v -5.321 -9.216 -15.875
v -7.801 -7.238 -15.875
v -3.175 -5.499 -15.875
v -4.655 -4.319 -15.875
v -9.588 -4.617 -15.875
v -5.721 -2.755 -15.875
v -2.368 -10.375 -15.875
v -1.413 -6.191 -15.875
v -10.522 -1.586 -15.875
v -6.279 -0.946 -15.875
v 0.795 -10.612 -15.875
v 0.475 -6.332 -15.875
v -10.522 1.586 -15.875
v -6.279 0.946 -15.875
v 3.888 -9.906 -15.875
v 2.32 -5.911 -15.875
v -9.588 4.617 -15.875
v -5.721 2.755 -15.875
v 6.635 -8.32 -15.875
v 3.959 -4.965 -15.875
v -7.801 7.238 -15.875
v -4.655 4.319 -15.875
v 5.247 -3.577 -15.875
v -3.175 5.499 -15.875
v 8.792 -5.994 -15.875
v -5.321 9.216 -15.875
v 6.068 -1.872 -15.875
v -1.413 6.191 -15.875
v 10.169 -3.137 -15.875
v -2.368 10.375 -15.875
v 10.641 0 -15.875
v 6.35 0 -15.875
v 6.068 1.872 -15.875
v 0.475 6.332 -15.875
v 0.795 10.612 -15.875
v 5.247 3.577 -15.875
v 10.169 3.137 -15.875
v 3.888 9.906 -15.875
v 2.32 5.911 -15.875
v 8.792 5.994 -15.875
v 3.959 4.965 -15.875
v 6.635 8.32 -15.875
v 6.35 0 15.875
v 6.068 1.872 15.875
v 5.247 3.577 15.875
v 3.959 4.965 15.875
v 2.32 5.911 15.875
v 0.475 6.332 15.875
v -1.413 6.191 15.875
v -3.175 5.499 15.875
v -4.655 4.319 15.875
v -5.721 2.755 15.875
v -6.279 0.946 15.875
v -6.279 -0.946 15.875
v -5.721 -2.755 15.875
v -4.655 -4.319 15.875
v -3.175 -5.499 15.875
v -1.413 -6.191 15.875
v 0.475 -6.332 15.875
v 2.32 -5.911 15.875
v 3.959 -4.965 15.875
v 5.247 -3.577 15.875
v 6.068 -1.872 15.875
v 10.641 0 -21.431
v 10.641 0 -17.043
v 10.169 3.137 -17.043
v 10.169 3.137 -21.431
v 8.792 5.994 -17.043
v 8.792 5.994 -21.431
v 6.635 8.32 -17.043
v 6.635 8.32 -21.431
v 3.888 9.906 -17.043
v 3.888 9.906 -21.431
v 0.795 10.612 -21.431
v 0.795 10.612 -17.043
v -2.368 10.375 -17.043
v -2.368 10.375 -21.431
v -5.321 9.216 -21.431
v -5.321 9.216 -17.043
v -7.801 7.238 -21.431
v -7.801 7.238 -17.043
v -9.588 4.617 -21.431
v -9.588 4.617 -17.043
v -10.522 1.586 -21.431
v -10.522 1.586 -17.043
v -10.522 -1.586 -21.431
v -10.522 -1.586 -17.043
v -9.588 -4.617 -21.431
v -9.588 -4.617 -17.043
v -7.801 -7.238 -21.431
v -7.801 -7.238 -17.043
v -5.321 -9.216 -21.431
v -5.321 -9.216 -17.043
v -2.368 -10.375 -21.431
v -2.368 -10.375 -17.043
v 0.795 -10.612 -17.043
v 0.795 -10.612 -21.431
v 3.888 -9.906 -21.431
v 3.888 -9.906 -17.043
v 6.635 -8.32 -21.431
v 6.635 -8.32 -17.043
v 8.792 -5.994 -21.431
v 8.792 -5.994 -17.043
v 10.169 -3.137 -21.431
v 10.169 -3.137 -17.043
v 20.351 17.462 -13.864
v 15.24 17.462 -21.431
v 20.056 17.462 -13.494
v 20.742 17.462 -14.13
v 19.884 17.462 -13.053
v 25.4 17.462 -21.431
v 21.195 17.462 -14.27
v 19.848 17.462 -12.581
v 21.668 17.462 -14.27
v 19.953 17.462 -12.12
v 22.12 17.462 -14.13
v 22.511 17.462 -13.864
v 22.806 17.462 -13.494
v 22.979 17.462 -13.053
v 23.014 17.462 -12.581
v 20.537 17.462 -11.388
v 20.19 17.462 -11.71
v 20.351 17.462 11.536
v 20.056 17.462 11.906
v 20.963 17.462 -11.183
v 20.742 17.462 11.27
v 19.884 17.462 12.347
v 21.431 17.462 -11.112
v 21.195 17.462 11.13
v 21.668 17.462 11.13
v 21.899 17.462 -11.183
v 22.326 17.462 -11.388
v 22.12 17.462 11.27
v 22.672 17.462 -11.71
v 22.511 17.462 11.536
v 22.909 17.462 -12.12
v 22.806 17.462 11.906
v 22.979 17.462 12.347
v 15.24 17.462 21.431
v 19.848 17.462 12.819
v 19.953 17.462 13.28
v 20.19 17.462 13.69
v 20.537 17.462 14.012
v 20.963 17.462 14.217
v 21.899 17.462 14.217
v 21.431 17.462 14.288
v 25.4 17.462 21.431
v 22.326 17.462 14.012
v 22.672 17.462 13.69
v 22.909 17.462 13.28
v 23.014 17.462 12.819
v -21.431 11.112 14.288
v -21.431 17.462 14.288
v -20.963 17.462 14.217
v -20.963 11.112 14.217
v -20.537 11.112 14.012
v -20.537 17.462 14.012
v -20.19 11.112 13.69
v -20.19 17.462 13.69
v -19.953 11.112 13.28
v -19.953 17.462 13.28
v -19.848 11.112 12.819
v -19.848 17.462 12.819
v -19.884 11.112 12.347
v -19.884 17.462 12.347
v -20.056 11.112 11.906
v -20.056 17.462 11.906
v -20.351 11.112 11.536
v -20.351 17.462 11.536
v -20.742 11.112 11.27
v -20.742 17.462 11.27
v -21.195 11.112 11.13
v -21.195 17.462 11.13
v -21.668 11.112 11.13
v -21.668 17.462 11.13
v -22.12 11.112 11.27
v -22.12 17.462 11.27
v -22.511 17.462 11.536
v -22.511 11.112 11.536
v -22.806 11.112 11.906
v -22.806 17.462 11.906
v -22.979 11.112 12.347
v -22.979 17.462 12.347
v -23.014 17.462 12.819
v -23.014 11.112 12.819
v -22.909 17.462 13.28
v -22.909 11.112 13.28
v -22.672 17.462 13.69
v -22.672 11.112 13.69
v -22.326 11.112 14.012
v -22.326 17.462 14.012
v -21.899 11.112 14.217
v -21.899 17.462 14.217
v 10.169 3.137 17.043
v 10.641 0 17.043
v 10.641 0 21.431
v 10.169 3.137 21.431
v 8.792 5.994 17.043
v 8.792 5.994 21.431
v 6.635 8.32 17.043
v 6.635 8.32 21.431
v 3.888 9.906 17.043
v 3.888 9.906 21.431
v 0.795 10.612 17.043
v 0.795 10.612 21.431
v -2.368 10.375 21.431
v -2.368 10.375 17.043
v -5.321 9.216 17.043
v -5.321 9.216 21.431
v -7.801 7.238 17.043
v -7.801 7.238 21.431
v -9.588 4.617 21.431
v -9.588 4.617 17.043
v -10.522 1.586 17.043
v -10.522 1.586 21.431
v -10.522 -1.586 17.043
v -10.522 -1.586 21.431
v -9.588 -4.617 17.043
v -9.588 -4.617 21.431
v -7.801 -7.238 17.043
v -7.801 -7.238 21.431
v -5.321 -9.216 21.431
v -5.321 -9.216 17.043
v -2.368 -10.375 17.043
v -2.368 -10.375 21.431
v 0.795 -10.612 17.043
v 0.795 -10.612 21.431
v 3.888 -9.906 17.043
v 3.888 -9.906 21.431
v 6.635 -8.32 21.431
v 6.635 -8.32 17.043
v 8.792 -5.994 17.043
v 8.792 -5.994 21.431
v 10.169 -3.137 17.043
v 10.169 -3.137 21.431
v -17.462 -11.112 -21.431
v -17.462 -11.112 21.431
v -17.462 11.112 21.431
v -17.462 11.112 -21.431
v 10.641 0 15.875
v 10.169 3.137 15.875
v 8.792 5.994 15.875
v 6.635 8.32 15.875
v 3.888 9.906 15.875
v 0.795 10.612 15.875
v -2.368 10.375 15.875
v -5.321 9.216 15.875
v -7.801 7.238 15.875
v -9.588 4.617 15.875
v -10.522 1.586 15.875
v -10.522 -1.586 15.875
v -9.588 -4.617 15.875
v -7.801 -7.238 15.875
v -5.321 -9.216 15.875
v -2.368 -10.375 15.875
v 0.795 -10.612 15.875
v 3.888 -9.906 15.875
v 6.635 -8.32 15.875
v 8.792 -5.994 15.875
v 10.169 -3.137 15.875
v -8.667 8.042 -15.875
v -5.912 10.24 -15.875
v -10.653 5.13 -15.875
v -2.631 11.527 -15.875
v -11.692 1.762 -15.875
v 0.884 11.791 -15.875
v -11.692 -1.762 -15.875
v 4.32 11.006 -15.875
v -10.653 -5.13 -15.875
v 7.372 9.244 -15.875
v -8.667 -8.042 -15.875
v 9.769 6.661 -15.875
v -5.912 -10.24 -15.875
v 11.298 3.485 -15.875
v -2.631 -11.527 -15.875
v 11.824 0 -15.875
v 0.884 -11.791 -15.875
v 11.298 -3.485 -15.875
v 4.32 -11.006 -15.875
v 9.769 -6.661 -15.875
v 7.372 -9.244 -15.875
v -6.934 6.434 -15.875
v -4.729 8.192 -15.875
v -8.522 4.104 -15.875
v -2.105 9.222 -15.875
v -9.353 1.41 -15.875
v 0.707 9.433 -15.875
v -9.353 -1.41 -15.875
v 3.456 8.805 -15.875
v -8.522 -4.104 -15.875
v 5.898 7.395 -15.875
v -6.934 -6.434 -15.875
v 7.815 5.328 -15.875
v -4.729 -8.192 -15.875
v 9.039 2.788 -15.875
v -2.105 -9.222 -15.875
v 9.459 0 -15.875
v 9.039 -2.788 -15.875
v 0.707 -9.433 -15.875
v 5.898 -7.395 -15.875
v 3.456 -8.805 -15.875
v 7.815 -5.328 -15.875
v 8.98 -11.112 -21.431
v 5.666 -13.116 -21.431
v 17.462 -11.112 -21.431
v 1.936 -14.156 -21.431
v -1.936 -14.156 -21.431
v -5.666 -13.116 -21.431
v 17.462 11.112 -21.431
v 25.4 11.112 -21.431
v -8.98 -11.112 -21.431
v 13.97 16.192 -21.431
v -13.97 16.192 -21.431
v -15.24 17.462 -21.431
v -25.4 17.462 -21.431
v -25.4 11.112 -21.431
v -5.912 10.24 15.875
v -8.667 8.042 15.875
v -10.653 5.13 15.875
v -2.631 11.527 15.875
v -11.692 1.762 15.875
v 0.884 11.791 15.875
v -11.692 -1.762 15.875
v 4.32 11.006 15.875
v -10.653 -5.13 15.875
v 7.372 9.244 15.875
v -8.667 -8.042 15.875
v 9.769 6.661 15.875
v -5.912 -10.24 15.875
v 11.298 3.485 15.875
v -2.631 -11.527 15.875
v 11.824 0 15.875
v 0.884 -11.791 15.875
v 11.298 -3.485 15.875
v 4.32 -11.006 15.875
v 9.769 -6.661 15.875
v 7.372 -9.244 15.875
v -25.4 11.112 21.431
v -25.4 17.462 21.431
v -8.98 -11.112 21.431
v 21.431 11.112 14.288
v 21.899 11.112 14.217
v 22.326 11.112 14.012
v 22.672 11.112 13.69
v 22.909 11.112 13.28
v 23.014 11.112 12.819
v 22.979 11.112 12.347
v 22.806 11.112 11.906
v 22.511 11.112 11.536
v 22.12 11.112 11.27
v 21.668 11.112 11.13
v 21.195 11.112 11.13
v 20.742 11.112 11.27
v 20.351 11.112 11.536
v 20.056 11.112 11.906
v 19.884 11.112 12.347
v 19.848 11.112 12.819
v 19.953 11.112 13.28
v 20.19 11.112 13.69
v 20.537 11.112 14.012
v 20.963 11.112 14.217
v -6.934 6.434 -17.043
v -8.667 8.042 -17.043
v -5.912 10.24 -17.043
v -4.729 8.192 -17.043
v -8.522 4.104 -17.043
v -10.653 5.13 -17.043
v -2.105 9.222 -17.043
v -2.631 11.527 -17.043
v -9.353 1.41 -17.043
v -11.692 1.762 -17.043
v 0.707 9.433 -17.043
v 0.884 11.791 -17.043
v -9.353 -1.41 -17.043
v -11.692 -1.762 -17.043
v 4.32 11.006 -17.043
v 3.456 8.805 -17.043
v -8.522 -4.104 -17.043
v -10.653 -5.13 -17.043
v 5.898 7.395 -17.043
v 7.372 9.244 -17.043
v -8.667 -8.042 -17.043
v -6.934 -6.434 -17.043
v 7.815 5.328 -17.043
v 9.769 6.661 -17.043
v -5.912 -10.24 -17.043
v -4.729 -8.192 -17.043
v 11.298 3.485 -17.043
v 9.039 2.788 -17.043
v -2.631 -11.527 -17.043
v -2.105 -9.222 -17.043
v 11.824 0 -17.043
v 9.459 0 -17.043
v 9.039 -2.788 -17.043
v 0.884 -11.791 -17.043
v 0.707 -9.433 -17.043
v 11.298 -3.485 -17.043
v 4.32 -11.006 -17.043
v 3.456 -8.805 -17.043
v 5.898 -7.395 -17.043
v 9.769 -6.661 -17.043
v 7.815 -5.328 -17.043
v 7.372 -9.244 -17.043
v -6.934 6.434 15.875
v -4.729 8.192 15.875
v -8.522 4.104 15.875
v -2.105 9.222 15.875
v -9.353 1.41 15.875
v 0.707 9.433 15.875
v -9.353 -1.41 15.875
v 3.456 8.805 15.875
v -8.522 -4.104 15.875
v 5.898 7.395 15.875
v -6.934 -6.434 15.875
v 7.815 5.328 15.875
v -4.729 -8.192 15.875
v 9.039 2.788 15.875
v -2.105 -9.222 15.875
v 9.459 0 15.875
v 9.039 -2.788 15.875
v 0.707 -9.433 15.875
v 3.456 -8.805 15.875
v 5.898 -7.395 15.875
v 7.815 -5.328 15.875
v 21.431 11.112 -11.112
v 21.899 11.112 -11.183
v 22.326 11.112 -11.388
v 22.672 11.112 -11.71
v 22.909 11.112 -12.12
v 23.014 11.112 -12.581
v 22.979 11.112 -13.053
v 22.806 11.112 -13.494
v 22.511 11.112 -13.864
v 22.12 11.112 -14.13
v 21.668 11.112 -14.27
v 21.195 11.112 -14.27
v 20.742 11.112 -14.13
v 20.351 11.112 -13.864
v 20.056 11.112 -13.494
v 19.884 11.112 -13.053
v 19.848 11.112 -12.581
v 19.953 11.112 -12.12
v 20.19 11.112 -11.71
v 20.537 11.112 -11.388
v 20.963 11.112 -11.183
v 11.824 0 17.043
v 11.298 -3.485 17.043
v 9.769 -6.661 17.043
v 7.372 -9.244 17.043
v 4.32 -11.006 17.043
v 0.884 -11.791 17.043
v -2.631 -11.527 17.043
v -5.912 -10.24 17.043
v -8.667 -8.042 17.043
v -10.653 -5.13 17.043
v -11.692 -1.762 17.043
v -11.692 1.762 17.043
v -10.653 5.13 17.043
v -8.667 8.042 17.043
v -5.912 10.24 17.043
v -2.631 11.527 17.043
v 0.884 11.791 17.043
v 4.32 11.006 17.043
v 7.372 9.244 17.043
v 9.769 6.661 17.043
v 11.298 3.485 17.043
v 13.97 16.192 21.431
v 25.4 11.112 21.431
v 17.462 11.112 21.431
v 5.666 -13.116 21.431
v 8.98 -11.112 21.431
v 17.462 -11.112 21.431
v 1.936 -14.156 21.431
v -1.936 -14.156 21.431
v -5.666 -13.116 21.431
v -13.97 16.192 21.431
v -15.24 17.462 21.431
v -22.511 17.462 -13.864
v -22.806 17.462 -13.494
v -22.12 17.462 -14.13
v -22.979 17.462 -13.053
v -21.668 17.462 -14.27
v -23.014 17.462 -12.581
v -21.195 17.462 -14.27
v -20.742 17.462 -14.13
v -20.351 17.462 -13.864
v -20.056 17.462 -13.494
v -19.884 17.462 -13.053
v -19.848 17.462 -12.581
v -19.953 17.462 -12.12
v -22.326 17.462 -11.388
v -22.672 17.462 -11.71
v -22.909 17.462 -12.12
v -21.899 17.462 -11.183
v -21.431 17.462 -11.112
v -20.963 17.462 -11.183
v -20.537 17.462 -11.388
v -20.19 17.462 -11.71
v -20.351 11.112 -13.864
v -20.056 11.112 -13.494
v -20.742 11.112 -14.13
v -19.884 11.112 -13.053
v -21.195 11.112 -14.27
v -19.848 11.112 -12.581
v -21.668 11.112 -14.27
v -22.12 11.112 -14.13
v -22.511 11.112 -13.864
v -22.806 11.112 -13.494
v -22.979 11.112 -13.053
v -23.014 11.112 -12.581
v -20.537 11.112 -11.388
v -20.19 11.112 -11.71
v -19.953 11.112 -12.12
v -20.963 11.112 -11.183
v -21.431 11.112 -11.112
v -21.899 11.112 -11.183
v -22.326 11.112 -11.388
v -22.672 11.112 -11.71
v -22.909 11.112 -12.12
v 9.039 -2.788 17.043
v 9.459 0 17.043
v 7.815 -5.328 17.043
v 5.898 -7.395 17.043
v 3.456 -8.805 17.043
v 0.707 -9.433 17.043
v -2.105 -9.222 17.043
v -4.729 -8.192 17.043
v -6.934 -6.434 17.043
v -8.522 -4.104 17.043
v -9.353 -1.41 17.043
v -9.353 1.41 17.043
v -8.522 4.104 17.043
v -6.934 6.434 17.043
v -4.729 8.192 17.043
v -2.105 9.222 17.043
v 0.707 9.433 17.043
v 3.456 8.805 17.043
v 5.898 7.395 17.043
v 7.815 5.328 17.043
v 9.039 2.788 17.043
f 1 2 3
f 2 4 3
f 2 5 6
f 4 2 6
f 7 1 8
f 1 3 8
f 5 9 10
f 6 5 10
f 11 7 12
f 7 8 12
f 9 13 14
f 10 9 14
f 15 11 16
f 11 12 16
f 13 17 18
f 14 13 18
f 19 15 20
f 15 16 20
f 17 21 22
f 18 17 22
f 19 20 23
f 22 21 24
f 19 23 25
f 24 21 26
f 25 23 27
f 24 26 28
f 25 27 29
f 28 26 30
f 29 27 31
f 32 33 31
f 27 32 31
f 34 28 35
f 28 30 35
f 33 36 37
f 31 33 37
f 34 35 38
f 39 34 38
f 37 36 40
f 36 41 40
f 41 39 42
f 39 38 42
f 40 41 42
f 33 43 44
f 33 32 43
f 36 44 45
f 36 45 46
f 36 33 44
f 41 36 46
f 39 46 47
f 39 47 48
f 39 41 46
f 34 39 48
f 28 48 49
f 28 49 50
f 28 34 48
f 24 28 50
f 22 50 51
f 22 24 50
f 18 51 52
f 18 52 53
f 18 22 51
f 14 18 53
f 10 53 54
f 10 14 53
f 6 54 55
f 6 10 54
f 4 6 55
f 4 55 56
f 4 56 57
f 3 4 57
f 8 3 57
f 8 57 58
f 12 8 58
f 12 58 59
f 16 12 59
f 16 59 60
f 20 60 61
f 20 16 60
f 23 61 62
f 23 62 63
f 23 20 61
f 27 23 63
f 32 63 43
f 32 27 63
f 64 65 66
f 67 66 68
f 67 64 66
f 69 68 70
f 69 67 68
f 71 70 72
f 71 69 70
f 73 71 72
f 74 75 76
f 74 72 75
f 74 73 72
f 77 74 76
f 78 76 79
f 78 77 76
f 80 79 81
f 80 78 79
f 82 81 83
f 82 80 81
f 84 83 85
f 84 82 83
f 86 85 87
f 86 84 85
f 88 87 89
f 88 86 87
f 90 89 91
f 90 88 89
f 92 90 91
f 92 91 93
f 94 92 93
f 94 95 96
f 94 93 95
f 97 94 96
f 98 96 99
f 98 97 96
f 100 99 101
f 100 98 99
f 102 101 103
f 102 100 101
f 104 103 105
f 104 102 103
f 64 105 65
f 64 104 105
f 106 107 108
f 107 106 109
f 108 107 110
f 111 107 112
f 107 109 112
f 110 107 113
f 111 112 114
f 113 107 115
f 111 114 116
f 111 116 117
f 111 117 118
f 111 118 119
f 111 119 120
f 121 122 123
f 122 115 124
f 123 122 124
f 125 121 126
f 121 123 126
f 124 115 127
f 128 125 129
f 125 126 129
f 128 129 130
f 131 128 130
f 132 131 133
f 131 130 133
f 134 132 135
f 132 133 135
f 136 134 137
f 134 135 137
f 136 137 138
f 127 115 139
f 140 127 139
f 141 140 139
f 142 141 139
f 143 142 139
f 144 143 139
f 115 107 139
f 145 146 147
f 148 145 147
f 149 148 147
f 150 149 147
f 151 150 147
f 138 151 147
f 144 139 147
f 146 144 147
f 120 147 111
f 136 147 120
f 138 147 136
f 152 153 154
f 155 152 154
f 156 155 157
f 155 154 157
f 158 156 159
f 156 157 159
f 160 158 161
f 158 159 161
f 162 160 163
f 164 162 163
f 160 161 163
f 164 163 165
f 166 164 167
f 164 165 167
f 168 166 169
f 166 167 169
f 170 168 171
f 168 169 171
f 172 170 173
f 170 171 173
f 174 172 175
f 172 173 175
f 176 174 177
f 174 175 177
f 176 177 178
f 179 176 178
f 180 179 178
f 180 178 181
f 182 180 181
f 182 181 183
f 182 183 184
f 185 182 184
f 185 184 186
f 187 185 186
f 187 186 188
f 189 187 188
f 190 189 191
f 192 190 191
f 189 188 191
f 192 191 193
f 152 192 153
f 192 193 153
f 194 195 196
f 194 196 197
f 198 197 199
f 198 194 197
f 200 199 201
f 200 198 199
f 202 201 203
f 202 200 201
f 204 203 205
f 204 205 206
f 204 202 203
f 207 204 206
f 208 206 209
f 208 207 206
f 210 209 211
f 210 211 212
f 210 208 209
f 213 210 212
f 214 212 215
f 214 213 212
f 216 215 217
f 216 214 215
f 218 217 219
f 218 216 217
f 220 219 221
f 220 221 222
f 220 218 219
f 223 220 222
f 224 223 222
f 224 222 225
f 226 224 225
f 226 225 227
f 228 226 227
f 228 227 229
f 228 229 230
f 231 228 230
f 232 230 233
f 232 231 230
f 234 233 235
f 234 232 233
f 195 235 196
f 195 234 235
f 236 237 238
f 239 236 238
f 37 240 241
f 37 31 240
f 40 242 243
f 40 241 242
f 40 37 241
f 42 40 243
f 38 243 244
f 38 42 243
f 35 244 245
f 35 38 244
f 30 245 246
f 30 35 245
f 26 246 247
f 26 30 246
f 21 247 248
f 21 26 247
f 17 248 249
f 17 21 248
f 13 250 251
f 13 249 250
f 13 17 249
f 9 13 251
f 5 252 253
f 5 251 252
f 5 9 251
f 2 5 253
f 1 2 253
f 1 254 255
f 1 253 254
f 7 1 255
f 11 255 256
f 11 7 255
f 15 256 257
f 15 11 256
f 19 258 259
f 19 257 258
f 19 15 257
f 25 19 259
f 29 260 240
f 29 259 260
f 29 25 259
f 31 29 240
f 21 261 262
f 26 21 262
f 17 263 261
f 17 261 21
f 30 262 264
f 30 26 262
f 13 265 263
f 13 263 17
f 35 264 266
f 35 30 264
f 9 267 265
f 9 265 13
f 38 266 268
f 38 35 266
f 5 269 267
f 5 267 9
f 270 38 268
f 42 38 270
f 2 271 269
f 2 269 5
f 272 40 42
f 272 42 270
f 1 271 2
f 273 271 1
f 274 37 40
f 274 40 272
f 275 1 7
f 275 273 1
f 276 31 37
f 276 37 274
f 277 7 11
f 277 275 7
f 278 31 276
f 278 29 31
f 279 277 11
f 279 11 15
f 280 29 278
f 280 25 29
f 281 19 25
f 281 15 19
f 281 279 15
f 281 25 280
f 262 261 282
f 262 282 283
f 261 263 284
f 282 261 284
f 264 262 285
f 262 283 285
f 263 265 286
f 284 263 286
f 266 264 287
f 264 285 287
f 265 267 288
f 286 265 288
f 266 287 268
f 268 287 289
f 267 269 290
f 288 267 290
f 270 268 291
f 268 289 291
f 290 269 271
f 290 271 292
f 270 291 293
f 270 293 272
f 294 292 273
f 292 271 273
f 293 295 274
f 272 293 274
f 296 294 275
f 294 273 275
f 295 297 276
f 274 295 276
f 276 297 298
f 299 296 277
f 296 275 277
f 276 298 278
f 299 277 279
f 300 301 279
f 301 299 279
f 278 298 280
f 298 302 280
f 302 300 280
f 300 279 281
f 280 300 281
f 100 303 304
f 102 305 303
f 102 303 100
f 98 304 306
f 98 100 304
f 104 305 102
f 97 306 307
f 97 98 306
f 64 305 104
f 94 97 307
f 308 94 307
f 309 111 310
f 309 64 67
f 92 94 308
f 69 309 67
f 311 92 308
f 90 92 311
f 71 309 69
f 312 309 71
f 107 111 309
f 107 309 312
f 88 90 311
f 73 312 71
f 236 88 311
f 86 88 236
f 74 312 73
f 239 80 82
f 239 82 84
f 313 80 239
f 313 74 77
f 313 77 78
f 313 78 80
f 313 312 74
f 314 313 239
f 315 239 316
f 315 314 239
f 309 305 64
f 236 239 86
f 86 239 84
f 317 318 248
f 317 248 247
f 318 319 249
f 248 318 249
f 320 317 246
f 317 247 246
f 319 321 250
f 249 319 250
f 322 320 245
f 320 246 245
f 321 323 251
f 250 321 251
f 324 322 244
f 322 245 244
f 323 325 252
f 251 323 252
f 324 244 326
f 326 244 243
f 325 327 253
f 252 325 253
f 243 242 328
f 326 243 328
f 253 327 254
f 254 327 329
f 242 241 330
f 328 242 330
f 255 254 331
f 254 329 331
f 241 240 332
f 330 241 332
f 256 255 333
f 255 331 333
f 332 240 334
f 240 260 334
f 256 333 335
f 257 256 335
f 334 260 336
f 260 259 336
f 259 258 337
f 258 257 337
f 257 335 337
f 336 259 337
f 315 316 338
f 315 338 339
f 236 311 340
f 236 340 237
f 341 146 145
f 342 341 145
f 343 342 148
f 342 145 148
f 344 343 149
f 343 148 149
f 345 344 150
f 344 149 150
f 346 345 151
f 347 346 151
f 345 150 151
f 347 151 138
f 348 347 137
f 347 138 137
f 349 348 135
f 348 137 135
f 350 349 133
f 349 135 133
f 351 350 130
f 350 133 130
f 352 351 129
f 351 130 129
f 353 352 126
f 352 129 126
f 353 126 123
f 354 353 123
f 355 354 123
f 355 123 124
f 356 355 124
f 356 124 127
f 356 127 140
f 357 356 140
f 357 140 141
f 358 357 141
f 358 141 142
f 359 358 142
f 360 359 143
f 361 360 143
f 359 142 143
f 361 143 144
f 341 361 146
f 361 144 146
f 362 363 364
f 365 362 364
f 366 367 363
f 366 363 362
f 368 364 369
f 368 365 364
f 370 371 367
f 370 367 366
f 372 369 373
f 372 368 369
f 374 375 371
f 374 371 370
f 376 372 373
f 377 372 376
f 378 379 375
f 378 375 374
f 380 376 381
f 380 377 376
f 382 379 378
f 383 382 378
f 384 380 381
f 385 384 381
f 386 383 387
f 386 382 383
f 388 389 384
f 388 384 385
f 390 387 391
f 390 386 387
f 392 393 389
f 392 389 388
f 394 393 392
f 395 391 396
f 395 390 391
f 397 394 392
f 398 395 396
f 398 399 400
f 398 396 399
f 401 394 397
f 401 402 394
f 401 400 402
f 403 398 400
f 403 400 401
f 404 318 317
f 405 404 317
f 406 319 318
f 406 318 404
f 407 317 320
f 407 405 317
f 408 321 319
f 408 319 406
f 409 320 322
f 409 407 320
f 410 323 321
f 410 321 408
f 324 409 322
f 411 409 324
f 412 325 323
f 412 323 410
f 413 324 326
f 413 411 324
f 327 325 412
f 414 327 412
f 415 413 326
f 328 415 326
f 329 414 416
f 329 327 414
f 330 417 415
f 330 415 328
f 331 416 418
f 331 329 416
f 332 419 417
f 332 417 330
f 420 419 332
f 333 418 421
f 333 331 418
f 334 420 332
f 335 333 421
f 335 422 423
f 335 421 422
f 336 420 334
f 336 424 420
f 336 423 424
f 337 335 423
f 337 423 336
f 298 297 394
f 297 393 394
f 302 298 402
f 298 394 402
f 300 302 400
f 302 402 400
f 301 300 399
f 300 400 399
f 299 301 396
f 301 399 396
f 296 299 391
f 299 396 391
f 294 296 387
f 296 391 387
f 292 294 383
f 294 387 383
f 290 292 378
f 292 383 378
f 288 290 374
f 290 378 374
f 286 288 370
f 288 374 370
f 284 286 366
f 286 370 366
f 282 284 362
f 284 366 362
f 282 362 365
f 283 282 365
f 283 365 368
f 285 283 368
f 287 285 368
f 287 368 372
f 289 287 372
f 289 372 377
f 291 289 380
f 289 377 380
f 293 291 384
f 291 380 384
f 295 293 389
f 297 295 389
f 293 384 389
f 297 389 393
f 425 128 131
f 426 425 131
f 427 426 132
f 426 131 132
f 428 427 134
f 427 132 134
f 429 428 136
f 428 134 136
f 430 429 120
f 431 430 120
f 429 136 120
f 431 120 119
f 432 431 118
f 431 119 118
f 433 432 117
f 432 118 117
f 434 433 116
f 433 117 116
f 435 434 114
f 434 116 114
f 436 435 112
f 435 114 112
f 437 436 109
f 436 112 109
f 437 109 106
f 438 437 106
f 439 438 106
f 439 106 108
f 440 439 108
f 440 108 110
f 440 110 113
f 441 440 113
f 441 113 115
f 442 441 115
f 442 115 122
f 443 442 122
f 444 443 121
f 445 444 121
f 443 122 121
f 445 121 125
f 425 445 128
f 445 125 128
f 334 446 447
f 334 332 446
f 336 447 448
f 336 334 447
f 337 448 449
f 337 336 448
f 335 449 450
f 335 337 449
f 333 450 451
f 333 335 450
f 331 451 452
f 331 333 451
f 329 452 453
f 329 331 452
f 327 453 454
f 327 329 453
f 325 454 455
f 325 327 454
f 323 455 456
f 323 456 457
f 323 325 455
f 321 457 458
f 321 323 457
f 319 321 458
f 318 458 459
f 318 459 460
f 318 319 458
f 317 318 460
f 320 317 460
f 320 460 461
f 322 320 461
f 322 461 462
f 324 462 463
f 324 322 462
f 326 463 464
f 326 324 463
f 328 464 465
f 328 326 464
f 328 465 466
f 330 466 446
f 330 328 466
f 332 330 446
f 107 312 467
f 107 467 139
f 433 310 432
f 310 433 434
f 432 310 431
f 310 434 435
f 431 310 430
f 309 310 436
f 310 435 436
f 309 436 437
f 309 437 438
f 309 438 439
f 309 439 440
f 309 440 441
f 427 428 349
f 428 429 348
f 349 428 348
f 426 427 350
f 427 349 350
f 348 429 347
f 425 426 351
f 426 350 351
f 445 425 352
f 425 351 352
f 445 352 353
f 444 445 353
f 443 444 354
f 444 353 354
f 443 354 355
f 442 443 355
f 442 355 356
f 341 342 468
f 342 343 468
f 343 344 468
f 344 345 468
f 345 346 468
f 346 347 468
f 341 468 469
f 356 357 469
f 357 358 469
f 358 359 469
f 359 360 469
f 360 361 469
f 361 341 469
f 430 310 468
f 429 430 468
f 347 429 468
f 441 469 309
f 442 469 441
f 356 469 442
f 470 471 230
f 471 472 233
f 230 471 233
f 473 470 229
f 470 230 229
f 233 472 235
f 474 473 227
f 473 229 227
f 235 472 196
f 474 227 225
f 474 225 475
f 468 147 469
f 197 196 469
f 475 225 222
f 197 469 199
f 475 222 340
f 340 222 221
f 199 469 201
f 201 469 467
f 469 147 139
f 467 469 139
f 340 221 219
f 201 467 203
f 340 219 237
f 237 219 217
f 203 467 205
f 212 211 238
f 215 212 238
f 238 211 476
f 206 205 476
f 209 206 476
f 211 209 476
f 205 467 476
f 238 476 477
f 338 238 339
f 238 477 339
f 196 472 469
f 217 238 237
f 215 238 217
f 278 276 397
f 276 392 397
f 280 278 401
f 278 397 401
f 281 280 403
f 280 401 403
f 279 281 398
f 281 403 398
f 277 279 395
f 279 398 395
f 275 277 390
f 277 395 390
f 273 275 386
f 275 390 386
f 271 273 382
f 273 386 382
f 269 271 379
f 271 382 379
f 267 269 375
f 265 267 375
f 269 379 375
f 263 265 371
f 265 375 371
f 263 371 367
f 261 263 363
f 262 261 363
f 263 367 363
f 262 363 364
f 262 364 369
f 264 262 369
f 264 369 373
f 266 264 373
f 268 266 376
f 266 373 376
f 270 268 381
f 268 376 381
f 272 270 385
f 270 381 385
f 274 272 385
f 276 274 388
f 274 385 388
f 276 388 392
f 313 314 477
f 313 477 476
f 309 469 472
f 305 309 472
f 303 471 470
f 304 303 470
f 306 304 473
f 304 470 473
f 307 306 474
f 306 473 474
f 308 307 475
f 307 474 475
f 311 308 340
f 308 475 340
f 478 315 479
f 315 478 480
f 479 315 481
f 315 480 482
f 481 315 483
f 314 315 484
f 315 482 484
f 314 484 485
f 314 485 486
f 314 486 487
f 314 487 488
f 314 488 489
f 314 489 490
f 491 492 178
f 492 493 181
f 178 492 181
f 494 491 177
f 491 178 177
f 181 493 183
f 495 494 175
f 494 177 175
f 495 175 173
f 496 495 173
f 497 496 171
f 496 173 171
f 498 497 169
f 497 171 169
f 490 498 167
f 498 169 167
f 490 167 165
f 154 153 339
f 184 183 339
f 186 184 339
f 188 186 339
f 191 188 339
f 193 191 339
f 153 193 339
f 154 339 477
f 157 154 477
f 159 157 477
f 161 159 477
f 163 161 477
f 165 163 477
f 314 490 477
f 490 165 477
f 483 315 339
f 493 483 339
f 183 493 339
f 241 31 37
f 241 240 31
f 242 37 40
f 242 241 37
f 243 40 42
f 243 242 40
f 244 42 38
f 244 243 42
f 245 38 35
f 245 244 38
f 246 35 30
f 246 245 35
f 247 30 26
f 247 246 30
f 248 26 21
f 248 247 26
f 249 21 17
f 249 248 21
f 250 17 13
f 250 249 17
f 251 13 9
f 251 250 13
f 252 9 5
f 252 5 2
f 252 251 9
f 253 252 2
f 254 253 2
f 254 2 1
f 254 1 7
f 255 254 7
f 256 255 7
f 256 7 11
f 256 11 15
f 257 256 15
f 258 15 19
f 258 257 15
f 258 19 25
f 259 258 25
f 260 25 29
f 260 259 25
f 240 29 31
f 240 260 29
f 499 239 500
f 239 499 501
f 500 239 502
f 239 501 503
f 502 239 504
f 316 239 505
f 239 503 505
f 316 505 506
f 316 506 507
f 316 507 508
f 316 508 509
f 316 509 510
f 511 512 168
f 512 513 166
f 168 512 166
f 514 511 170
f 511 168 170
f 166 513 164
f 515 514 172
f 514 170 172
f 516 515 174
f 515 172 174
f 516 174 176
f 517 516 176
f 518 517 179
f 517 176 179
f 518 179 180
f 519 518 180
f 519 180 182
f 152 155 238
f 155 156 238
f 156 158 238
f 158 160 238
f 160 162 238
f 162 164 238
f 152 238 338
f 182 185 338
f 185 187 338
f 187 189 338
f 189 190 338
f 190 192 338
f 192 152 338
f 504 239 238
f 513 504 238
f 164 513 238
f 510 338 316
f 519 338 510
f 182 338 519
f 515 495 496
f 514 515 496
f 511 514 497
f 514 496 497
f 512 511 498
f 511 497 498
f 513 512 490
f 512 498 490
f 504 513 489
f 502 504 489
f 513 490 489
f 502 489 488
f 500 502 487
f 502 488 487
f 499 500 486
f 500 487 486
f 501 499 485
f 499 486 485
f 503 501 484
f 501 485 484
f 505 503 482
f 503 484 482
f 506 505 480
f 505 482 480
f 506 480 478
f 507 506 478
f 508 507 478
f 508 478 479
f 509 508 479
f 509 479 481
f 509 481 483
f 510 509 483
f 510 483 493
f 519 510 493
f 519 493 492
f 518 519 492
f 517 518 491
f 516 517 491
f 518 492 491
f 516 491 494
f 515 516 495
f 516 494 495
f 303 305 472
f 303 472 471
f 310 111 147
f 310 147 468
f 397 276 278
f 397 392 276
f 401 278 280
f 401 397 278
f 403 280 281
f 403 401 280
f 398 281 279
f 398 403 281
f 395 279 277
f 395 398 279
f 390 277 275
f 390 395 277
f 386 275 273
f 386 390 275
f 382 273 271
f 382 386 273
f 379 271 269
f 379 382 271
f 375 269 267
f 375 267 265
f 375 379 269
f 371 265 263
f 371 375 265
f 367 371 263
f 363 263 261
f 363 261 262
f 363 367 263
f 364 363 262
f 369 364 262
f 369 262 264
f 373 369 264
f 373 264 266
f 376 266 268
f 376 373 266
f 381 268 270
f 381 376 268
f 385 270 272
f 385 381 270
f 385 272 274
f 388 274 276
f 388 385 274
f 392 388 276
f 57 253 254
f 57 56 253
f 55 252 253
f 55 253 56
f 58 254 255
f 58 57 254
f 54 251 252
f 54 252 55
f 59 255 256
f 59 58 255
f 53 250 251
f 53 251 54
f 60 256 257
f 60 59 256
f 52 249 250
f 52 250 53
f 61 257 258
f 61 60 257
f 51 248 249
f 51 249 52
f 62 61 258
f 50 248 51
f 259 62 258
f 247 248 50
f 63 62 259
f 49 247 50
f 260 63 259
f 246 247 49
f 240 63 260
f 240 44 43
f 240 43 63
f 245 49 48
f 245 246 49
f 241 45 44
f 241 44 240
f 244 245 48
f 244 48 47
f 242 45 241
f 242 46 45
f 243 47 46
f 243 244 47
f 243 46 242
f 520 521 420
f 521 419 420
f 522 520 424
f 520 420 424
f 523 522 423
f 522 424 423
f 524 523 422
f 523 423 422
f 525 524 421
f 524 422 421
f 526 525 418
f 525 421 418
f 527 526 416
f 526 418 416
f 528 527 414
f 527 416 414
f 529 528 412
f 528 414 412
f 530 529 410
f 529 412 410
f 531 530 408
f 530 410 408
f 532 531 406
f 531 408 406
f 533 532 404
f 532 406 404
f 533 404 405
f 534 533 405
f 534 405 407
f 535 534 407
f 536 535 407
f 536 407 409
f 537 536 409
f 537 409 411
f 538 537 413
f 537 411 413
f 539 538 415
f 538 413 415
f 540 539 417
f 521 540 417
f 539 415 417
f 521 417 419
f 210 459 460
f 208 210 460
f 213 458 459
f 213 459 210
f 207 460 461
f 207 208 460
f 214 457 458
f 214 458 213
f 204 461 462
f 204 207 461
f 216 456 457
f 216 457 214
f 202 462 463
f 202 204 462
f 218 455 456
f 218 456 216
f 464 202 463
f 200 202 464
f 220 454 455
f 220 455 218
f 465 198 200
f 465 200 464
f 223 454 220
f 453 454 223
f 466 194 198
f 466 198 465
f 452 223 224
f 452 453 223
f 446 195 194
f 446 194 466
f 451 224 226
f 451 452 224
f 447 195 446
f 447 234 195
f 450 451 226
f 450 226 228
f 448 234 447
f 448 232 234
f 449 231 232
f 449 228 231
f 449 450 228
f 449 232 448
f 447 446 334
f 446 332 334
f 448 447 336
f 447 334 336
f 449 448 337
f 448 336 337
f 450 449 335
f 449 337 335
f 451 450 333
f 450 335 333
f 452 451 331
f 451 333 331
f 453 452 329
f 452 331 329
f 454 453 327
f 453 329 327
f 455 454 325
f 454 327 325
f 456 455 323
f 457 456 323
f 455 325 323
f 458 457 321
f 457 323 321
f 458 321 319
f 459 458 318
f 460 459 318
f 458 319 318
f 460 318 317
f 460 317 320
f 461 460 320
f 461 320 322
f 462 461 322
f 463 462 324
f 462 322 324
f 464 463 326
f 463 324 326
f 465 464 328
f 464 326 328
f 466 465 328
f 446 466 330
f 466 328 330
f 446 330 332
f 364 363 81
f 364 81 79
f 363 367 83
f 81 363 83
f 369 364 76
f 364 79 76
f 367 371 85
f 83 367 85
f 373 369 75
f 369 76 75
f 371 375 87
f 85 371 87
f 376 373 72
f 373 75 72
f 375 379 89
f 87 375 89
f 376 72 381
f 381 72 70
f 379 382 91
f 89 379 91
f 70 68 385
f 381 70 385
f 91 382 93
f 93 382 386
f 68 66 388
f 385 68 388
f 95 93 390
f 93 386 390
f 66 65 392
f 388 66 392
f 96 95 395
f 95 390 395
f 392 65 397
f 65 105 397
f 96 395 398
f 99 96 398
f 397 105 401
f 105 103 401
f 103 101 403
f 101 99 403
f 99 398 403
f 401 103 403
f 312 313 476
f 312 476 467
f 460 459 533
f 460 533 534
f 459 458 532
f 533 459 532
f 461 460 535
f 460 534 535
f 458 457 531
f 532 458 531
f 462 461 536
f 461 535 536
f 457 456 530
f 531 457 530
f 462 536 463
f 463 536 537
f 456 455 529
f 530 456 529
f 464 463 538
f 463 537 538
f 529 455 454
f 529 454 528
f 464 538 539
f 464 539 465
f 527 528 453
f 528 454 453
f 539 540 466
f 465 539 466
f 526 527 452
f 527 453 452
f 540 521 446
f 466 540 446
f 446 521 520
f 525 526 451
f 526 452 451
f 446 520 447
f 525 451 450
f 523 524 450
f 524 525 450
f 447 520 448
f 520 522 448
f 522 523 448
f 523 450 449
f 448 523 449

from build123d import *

# Parameters (mm, degrees)
SKETCH1_R            = 10.64133
MAIN_BODY_DEPTH      = 21.43125
SKETCH3_R            = 1.5875
MOUNTING_HOLES_DEPTH = 6.35
SKETCH8_R            = 10.64133
SKETCH8_R_2          = 6.35
INTERIOR_DEPTH       = 15.875
GROOVES_2_W          = 1.1684
GROOVES_2_H          = 2.36474
GROOVES_2_2_W        = 1.1684
GROOVES_2_2_H        = 2.36474


with BuildPart() as part:
    # Sketch1 → Main Body (new, symmetric)
    with BuildSketch(Plane.XY):
        with BuildLine():
            Line((-17.4625, 11.1125), (-25.4, 11.1125))
            Line((-25.4, 11.1125), (-25.4, 17.4625))
            Line((-25.4, 17.4625), (-15.24, 17.4625))
            Line((-15.24, 17.4625), (-13.97, 16.1925))
            Line((-13.97, 16.1925), (13.97, 16.1925))
            Line((13.97, 16.1925), (15.24, 17.4625))
            Line((15.24, 17.4625), (25.4, 17.4625))
            Line((25.4, 17.4625), (25.4, 11.1125))
            Line((25.4, 11.1125), (17.4625, 11.1125))
            Line((17.4625, 11.1125), (17.4625, -11.1125))
            Line((17.4625, -11.1125), (8.980256121, -11.1125))
            ThreePointArc((8.980256121, -11.1125), (0, -14.2875), (-8.980256121, -11.1125))
            Line((-8.980256121, -11.1125), (-17.4625, -11.1125))
            Line((-17.4625, -11.1125), (-17.4625, 11.1125))
        make_face()
        Circle(SKETCH1_R, mode=Mode.SUBTRACT)
    extrude(amount=MAIN_BODY_DEPTH, both=True)

    # Sketch3 → Mounting Holes (cut)
    with BuildSketch(Plane(origin=(0, 17.4625, 0), x_dir=(1, 0, 0), z_dir=(0, 1, 0))):
        with Locations(Location((-21.43125, 12.7, 0), (0, 0, 270))):
            Circle(SKETCH3_R)
        with Locations(Location((21.43125, 12.7, 0), (0, 0, 270))):
            Circle(SKETCH3_R)
        with Locations(Location((21.43125, -12.7, 0), (0, 0, 270))):
            Circle(SKETCH3_R)
        with Locations(Location((-21.43125, -12.7, 0), (0, 0, 270))):
            Circle(SKETCH3_R)
    extrude(amount=-MOUNTING_HOLES_DEPTH, mode=Mode.SUBTRACT)

    # Grooves 2 → Grooves (revolve, cut)
    with BuildSketch(Plane(origin=(0, 0, 0), x_dir=(0, 0, -1), z_dir=(1, 0, 0)), mode=Mode.PRIVATE) as grooves_sk:
        with Locations((16.4592, -10.64133)):
            Rectangle(GROOVES_2_W, GROOVES_2_H)
        with Locations((-16.4592, -10.64133)):
            Rectangle(GROOVES_2_W, GROOVES_2_H)
    revolve(grooves_sk.sketch.rotate(Axis((0, 0, 15.875), (0, 0, -1)), 270), axis=Axis((0, 0, 15.875), (0, 0, -1)), mode=Mode.SUBTRACT)


with BuildPart() as body_2:
    # Sketch8 → Interior (new, symmetric)
    with BuildSketch(Plane.XY):
        Circle(SKETCH8_R)
        Circle(SKETCH8_R_2, mode=Mode.SUBTRACT)
    extrude(amount=INTERIOR_DEPTH, both=True)


with BuildPart() as body_3:
    # Grooves_2 2 → Retaining Ring (revolve)
    with BuildSketch(Plane(origin=(0, 0, 0), x_dir=(0, 0, -1), z_dir=(1, 0, 0)), mode=Mode.PRIVATE) as retaining_ring_sk:
        with Locations((16.4592, -10.64133)):
            Rectangle(GROOVES_2_2_W, GROOVES_2_2_H)
        with Locations((-16.4592, -10.64133)):
            Rectangle(GROOVES_2_2_W, GROOVES_2_2_H)
    revolve(retaining_ring_sk.sketch.rotate(Axis((0, 0, 15.875), (0, 0, -1)), 270), axis=Axis((0, 0, 15.875), (0, 0, -1)))


solid = Compound([part.part, body_2.part, body_3.part])
